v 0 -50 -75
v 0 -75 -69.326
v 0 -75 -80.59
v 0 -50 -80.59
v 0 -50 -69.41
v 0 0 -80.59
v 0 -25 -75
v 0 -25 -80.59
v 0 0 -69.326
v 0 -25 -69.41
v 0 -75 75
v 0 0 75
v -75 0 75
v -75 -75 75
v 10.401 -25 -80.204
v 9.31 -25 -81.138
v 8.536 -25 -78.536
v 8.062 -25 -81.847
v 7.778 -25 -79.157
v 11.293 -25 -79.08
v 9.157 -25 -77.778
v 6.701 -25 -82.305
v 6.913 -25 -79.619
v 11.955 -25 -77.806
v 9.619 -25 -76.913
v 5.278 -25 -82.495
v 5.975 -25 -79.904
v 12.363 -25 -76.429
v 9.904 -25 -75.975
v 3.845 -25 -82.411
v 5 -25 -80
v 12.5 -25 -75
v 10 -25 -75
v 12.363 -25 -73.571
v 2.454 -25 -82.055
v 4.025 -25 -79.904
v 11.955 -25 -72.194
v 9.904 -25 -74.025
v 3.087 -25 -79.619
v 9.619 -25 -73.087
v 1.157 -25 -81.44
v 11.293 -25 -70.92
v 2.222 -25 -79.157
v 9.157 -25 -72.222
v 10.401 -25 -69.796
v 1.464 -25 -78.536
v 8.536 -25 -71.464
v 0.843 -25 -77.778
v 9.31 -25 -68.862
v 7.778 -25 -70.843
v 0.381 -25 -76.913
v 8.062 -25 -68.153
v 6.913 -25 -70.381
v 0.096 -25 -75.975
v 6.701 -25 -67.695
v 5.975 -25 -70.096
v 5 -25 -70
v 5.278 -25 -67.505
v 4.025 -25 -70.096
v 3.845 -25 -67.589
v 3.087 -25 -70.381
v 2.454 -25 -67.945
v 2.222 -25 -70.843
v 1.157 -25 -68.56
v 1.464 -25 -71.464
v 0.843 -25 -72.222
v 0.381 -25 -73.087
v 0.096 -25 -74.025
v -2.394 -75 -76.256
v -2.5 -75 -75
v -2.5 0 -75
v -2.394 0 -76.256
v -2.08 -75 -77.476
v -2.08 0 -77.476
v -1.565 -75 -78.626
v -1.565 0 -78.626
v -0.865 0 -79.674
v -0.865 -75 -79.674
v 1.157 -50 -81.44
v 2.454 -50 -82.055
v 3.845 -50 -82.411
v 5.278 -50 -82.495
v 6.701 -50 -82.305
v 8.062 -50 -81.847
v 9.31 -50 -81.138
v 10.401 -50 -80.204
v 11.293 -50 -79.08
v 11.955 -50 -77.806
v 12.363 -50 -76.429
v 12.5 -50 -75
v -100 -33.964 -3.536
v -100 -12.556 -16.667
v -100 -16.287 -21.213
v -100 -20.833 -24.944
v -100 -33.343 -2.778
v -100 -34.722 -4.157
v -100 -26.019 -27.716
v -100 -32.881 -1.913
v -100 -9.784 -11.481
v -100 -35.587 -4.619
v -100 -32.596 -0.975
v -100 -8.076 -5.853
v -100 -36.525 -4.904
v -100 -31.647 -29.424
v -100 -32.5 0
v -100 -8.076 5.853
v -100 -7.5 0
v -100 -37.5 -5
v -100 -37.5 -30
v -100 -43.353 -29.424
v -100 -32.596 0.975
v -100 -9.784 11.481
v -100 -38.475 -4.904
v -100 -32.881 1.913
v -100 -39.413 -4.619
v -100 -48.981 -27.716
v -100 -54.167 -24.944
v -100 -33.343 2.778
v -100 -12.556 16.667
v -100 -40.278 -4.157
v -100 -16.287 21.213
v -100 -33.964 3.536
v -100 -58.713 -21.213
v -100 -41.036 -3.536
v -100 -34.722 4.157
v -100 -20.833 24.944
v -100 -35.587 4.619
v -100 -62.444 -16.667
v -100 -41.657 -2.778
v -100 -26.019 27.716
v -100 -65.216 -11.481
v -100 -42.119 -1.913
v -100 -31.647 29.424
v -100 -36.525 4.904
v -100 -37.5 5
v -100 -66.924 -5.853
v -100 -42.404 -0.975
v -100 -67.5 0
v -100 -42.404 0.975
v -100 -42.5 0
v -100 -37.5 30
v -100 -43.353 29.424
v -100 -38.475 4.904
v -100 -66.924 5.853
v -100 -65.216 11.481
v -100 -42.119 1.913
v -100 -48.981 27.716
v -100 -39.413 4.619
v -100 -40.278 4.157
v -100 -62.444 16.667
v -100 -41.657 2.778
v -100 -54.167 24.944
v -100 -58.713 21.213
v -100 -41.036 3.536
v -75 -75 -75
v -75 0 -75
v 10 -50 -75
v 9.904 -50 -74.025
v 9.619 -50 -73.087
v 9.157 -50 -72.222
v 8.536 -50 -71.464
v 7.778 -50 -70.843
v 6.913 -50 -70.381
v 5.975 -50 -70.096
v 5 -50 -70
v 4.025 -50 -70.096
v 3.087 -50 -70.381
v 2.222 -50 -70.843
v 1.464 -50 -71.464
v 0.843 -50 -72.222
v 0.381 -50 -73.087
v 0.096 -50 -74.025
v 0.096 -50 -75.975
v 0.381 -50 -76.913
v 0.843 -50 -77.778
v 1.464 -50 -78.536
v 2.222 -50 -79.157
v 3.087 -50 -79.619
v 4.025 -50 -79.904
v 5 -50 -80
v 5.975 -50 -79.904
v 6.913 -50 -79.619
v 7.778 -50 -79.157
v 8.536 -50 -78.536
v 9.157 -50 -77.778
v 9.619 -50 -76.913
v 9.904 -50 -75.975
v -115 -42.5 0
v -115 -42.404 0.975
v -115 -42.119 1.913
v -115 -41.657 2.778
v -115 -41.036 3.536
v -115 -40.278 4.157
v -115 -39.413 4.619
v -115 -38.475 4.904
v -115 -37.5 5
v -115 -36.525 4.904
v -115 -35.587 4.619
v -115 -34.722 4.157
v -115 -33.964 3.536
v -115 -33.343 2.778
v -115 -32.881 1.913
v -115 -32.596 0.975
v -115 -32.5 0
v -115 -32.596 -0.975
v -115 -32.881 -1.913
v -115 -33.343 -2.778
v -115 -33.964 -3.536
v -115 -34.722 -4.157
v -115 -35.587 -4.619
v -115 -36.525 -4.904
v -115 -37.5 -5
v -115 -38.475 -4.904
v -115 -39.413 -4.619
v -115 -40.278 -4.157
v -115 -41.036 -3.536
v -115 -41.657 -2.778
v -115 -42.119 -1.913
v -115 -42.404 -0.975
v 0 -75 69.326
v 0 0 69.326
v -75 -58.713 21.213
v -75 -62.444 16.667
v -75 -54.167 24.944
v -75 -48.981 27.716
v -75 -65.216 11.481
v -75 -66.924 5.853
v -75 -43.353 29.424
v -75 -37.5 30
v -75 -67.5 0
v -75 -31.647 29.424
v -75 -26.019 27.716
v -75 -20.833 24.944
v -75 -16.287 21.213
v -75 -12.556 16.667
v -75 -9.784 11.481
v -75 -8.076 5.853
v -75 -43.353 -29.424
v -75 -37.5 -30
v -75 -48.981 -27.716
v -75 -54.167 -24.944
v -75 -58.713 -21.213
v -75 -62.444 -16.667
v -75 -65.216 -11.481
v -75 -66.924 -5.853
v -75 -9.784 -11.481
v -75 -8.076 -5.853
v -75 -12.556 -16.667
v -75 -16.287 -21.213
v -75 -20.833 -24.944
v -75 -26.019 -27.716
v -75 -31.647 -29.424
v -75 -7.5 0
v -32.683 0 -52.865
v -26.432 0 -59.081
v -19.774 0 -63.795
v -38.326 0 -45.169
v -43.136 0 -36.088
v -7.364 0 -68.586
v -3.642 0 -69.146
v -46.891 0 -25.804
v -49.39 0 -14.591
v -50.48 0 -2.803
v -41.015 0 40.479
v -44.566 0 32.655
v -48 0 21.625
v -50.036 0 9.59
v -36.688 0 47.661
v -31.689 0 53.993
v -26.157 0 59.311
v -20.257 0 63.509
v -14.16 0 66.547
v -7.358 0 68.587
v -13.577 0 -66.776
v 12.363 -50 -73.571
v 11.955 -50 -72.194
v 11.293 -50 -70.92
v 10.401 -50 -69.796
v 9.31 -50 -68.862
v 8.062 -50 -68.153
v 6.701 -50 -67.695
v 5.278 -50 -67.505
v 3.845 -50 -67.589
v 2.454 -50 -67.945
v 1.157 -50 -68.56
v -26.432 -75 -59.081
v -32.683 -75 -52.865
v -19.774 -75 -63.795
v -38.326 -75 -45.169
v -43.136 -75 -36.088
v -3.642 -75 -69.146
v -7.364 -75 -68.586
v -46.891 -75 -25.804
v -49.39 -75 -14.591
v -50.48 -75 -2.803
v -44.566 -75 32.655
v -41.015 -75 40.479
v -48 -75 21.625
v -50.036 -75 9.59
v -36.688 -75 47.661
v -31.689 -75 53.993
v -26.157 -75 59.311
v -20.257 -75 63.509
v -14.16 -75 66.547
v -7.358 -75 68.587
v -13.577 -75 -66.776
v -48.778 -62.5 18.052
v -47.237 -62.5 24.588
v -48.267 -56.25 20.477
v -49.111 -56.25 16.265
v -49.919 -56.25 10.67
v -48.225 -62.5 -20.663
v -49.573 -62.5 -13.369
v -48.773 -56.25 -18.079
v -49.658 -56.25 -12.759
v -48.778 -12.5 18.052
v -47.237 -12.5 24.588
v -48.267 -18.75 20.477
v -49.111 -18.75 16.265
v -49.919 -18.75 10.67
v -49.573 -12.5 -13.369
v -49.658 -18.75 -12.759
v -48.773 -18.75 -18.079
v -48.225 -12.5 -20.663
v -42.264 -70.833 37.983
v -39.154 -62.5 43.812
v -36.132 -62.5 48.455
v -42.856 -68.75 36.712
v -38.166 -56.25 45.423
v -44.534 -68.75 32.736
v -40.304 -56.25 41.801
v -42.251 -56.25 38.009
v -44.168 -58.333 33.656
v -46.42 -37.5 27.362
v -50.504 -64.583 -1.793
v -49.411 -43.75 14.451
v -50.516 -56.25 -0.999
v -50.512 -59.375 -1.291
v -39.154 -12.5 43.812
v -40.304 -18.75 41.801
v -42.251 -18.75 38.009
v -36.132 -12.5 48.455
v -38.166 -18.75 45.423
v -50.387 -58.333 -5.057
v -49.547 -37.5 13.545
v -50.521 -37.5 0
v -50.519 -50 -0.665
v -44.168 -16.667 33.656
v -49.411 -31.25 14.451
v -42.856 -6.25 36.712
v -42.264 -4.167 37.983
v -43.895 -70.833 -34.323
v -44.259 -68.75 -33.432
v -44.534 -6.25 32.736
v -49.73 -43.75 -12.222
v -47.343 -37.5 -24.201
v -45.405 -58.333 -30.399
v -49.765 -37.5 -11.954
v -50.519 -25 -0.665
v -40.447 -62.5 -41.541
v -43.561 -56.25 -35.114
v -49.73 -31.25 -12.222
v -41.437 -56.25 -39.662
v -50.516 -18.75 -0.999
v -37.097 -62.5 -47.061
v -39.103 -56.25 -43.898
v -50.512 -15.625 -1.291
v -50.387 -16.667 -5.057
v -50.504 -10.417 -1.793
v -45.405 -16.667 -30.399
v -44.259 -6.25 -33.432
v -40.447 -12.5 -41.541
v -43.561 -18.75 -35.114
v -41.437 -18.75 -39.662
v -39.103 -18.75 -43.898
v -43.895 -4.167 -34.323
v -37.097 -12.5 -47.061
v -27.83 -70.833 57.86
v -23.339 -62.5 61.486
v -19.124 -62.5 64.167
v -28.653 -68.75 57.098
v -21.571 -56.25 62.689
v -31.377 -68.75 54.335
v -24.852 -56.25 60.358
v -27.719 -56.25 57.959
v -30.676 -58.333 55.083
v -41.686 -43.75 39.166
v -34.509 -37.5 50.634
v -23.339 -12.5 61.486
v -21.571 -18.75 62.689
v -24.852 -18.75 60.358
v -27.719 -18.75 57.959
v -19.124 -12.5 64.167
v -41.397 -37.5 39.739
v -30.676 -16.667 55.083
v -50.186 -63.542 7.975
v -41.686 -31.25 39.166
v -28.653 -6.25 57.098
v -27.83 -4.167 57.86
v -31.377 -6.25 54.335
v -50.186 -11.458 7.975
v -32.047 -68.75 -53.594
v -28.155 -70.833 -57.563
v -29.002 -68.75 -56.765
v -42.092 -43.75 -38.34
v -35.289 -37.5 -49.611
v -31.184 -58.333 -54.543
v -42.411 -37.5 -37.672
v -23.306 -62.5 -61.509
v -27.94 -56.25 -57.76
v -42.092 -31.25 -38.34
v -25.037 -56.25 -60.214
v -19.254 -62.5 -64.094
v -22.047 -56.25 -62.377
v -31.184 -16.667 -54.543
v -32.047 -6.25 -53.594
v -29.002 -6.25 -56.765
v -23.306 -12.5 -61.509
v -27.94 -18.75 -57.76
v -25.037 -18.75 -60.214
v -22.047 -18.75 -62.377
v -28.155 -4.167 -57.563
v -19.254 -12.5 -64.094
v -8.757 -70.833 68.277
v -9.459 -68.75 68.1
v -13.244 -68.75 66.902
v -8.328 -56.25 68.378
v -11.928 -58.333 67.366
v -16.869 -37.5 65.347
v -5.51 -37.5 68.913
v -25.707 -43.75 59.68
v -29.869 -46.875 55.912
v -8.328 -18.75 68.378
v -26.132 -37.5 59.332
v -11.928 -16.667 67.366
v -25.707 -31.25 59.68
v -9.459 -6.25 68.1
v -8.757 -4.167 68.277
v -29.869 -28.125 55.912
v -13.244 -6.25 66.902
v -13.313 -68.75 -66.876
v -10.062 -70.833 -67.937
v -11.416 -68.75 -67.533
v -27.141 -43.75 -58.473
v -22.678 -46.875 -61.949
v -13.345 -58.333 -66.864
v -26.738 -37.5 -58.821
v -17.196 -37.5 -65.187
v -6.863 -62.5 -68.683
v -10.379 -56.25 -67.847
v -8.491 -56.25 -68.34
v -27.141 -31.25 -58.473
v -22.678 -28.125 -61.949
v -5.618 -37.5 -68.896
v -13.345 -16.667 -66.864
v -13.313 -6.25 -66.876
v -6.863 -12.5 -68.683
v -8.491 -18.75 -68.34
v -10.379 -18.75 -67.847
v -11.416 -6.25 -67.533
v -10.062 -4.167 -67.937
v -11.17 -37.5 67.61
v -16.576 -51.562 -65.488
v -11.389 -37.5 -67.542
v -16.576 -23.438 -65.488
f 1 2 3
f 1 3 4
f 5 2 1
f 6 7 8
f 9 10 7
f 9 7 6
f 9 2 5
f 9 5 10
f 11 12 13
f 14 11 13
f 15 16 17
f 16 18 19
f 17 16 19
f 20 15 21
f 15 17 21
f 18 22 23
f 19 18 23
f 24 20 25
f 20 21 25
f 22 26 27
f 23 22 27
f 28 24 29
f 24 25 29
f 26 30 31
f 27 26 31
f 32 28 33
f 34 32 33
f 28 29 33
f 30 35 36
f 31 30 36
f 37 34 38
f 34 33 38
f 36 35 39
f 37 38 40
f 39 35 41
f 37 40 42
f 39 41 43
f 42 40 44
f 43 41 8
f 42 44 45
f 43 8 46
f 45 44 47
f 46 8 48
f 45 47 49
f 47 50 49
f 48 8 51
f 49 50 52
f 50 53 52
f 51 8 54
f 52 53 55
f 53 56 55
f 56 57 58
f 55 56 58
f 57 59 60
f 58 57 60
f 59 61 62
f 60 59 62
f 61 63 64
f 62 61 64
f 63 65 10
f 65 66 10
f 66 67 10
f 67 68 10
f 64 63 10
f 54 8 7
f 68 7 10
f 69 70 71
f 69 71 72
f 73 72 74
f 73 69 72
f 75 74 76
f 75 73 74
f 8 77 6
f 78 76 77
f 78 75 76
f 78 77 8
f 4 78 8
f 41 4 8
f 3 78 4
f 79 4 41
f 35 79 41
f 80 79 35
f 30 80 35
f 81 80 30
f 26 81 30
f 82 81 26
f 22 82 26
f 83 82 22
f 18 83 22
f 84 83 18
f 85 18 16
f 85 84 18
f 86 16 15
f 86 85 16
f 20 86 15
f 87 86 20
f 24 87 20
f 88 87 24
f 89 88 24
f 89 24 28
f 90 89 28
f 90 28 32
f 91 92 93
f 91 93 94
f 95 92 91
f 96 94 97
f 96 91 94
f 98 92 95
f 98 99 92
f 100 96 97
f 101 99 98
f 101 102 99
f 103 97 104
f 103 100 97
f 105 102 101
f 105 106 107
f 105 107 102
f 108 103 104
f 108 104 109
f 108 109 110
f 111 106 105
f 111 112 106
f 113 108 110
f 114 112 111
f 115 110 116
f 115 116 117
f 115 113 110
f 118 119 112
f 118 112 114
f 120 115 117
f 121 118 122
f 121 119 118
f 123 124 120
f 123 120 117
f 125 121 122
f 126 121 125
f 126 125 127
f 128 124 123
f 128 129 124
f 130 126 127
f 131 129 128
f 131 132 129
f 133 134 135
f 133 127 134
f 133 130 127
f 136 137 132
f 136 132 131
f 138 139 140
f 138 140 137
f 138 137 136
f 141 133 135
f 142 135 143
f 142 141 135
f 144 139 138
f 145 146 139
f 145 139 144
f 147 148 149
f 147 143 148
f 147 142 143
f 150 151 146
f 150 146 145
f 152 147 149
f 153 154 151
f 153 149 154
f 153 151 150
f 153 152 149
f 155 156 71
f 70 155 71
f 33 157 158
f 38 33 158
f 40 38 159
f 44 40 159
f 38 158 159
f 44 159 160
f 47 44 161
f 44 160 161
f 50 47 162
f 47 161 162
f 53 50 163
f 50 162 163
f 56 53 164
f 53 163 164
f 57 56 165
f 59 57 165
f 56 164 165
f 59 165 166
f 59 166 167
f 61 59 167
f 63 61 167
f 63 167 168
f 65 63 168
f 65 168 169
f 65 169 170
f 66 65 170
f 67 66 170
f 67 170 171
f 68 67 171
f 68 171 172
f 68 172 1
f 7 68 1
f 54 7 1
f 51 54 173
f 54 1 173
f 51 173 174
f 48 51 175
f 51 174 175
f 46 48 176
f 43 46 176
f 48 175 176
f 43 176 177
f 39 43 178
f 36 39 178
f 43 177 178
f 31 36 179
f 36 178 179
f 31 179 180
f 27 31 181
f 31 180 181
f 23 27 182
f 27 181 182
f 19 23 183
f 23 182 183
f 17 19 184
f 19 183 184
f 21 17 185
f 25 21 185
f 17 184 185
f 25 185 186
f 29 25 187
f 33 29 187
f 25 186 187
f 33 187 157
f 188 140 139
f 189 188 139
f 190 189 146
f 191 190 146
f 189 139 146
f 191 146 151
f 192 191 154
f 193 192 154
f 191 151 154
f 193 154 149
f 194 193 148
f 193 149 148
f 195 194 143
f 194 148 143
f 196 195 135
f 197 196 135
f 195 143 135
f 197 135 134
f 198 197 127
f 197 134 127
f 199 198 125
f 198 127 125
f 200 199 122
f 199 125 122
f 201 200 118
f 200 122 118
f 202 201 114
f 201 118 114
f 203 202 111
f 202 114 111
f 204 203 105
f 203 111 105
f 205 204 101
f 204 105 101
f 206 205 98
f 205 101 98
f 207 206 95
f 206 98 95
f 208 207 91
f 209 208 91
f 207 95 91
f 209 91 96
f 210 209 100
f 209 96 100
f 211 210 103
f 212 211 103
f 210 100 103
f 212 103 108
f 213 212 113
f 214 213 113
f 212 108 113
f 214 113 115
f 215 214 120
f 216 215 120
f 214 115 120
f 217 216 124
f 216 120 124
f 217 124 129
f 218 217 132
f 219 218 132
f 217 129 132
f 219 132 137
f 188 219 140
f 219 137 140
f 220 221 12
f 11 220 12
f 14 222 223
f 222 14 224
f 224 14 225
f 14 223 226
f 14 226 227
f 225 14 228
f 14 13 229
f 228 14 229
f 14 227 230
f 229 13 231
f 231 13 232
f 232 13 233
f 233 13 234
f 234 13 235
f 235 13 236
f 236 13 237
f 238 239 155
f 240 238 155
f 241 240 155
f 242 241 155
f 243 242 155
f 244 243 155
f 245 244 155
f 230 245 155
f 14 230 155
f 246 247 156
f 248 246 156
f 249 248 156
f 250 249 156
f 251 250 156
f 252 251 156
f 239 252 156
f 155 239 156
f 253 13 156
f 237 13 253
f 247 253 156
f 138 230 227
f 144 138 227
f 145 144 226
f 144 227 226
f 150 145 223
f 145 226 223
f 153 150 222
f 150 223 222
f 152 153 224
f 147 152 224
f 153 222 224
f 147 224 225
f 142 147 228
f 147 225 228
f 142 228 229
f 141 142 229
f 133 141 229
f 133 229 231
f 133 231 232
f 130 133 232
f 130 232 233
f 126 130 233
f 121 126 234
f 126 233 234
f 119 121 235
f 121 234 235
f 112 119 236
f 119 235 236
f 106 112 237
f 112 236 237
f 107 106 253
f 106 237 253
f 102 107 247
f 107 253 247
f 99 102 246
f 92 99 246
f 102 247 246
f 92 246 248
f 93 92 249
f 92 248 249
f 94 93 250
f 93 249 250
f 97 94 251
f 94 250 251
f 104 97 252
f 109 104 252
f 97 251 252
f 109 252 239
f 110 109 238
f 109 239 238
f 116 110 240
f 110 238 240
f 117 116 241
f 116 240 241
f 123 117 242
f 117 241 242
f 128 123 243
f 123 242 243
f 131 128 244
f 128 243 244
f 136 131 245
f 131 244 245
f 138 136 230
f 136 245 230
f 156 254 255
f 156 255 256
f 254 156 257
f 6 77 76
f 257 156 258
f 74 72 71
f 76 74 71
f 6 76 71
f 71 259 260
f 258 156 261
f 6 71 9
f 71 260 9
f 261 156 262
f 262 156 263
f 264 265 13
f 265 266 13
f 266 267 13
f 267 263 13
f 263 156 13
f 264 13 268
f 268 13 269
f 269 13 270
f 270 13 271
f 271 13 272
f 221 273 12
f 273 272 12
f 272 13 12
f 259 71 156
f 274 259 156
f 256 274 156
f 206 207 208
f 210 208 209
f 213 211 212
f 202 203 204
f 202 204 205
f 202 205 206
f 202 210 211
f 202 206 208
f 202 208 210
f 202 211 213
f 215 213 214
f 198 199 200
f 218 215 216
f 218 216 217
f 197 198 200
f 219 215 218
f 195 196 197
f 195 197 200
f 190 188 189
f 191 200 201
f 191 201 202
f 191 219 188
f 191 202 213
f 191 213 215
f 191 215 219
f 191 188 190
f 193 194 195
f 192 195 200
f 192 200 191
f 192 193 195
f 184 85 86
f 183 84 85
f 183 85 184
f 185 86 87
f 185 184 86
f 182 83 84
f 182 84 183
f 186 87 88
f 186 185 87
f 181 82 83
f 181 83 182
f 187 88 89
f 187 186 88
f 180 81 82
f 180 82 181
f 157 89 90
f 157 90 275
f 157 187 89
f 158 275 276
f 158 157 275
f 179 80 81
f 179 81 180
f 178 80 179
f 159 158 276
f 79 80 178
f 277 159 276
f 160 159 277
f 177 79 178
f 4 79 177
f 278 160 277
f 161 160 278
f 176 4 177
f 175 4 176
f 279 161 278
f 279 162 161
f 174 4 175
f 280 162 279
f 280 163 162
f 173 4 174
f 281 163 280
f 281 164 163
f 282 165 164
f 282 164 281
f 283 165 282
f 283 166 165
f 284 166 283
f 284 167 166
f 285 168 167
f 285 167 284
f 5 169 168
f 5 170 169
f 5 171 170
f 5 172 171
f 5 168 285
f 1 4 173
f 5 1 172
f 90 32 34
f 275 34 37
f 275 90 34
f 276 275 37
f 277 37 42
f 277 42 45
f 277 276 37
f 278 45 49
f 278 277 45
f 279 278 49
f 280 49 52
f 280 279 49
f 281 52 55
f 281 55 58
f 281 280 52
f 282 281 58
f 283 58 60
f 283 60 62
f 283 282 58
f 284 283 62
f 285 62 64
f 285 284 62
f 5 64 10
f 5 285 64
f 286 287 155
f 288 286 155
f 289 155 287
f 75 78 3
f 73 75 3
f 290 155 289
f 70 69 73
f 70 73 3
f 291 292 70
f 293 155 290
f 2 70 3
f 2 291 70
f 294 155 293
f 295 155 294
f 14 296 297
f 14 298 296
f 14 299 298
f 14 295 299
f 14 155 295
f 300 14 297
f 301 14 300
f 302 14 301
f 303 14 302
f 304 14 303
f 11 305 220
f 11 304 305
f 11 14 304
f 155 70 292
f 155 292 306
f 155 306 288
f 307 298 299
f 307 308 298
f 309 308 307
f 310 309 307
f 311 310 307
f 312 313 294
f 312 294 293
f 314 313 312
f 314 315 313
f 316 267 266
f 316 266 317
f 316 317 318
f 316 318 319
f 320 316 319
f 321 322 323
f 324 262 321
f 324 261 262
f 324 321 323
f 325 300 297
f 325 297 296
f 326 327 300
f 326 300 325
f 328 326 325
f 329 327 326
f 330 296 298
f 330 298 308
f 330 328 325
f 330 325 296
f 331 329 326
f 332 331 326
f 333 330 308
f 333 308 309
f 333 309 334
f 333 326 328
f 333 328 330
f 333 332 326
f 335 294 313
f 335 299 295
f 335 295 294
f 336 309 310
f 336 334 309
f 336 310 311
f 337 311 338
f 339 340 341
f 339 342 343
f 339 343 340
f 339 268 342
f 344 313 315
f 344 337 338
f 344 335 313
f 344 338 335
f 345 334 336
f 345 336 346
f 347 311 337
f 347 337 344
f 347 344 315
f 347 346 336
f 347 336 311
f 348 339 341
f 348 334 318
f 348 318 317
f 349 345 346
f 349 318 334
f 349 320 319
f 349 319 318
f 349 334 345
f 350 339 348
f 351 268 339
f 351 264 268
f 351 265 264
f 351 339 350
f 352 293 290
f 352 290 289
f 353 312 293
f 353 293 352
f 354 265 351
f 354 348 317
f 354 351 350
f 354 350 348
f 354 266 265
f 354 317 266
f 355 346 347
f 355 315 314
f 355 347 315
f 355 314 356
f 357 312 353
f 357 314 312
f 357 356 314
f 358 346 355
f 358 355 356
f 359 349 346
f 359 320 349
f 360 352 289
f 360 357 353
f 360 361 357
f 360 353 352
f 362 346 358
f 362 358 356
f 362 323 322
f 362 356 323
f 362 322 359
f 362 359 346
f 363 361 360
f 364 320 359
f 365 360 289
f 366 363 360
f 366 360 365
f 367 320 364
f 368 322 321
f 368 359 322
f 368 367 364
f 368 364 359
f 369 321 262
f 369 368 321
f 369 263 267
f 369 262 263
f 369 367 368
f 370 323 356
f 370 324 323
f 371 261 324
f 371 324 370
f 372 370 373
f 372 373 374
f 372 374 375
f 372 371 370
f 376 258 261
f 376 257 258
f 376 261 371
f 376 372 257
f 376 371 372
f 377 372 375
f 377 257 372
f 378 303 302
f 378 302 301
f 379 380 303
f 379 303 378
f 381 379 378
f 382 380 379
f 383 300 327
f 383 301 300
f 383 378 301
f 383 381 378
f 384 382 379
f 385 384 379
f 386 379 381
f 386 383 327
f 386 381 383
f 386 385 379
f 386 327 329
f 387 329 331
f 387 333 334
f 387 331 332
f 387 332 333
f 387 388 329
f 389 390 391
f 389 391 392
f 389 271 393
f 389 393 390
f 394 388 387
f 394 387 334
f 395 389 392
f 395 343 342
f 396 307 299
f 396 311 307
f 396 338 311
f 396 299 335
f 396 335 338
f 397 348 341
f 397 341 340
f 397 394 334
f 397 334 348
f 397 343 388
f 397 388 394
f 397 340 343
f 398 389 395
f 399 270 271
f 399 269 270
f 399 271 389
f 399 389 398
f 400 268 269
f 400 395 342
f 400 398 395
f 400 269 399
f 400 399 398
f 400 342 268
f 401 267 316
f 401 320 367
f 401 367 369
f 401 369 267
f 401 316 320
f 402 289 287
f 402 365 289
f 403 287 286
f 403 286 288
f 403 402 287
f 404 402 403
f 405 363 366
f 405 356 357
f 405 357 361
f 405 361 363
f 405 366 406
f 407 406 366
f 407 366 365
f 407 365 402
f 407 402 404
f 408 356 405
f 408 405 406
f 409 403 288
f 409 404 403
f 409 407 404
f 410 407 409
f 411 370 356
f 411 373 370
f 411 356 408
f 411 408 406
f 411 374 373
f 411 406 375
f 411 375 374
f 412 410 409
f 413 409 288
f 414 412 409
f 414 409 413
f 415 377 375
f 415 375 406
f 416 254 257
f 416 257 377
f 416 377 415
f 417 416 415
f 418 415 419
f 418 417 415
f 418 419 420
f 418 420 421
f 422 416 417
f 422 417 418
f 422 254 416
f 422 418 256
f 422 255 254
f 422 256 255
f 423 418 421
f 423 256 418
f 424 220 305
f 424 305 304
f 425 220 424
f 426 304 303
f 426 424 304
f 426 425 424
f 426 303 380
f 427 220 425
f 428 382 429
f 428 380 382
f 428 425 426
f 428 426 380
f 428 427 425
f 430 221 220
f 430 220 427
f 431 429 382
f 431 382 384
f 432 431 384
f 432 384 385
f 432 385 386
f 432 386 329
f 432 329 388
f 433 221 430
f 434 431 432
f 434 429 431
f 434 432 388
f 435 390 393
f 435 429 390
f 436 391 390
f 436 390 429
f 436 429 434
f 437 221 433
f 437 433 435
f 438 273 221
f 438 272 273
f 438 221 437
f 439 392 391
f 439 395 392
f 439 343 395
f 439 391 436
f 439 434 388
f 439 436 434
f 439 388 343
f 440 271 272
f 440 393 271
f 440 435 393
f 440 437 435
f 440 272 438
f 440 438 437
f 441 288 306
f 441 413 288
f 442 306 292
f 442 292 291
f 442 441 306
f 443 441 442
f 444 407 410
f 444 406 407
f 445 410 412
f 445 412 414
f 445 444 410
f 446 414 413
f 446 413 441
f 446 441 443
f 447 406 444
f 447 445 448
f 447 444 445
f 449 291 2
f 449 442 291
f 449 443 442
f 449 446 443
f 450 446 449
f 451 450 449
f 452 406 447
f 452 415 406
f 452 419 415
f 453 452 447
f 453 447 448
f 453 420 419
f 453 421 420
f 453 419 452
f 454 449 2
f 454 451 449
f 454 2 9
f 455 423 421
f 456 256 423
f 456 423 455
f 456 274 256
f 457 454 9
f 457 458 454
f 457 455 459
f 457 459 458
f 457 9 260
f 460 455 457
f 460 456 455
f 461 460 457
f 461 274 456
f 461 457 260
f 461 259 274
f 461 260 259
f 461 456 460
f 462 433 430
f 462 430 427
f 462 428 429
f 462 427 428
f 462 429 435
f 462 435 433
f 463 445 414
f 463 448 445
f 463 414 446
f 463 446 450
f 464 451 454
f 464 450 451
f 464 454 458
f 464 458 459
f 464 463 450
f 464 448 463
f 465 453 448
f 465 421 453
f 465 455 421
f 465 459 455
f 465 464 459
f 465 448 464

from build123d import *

# Parameters (mm, degrees)
F1_DEPTH  = 75
F2_R      = 30
F3_DEPTH  = 25
F4_R      = 5
F5_DEPTH  = 15
F7_DEPTH  = 75
F8_R      = 5
F9_DEPTH  = 75
F10_W     = 25
F10_H     = 45.2830219137
F10_W_2   = 34.9056578674
F10_H_2   = 56.6037699187
F11_DEPTH = 25


# Not quite as in the source:
# - a feature names something its author has since deleted; it is built from what else it names


with BuildPart() as f1:
    # F0 (on Front) → F1 (new body)
    with BuildSketch(Plane.XZ):
        with BuildLine():
            Line((-75, -75), (0, -75))
            Line((0, -75), (0, -69.3261250854))
            add(Edge.make_bspline(
                [(0, 69.3261250854), (-50.5212285231, 69.3261250854), (-50.5212285231, 0), (-50.5212285231, -69.3261250854), (0, -69.3261250854)],
                knots=[3.1415926536, 3.1415926536, 3.1415926536, 4.7123889804, 4.7123889804, 6.2831853072, 6.2831853072, 6.2831853072], degree=2, weights=[1, 0.7071067812, 1, 0.7071067812, 1]))
            Line((0, 69.3261250854), (0, 75))
            Line((0, 75), (-75, 75))
            Line((-75, 75), (-75, -75))
        make_face()
    extrude(amount=F1_DEPTH)

    # F2 (on face) → F3 (join)
    with BuildSketch(Plane(origin=(-75, 0, 0), x_dir=(0, -1, 0), z_dir=(-1, 0, 0))):
        with Locations((37.5, 0)):
            Circle(F2_R)
    extrude(amount=F3_DEPTH)

    # F4 (on face) → F5 (join)
    with BuildSketch(Plane(origin=(-100, 0, 0), x_dir=(0, -1, 0), z_dir=(-1, 0, 0))):
        with Locations((37.5, 0)):
            Circle(F4_R)
    extrude(amount=F5_DEPTH)

    # F6 (on face) → F7 (join)
    with BuildSketch(Plane.XZ.offset(75)):
        with BuildLine():
            ThreePointArc((-2.5, -75), (5, -82.5), (12.5, -75))
            ThreePointArc((12.5, -75), (8.0618621785, -68.1534680312), (0, -69.4098300563))
            Line((0, -69.4098300563), (0, -75))
            Line((0, -75), (-2.5, -75))
        make_face()
    extrude(amount=-F7_DEPTH)

    # F8 (on face) → F9 (cut)
    with BuildSketch(Plane.XZ.offset(75)):
        with Locations((5, -75)):
            Circle(F8_R)
    extrude(amount=-F9_DEPTH, mode=Mode.SUBTRACT)

    # F10 (on Right) → F11 (cut)
    with BuildSketch(Plane.YZ):
        with Locations((-62.5, -78.4633336838)):
            Rectangle(F10_W, F10_H)
        with Locations((-7.5471710663, -85.2243384972)):
            Rectangle(F10_W_2, F10_H_2)
    extrude(amount=F11_DEPTH, mode=Mode.SUBTRACT)


solid = f1.part
